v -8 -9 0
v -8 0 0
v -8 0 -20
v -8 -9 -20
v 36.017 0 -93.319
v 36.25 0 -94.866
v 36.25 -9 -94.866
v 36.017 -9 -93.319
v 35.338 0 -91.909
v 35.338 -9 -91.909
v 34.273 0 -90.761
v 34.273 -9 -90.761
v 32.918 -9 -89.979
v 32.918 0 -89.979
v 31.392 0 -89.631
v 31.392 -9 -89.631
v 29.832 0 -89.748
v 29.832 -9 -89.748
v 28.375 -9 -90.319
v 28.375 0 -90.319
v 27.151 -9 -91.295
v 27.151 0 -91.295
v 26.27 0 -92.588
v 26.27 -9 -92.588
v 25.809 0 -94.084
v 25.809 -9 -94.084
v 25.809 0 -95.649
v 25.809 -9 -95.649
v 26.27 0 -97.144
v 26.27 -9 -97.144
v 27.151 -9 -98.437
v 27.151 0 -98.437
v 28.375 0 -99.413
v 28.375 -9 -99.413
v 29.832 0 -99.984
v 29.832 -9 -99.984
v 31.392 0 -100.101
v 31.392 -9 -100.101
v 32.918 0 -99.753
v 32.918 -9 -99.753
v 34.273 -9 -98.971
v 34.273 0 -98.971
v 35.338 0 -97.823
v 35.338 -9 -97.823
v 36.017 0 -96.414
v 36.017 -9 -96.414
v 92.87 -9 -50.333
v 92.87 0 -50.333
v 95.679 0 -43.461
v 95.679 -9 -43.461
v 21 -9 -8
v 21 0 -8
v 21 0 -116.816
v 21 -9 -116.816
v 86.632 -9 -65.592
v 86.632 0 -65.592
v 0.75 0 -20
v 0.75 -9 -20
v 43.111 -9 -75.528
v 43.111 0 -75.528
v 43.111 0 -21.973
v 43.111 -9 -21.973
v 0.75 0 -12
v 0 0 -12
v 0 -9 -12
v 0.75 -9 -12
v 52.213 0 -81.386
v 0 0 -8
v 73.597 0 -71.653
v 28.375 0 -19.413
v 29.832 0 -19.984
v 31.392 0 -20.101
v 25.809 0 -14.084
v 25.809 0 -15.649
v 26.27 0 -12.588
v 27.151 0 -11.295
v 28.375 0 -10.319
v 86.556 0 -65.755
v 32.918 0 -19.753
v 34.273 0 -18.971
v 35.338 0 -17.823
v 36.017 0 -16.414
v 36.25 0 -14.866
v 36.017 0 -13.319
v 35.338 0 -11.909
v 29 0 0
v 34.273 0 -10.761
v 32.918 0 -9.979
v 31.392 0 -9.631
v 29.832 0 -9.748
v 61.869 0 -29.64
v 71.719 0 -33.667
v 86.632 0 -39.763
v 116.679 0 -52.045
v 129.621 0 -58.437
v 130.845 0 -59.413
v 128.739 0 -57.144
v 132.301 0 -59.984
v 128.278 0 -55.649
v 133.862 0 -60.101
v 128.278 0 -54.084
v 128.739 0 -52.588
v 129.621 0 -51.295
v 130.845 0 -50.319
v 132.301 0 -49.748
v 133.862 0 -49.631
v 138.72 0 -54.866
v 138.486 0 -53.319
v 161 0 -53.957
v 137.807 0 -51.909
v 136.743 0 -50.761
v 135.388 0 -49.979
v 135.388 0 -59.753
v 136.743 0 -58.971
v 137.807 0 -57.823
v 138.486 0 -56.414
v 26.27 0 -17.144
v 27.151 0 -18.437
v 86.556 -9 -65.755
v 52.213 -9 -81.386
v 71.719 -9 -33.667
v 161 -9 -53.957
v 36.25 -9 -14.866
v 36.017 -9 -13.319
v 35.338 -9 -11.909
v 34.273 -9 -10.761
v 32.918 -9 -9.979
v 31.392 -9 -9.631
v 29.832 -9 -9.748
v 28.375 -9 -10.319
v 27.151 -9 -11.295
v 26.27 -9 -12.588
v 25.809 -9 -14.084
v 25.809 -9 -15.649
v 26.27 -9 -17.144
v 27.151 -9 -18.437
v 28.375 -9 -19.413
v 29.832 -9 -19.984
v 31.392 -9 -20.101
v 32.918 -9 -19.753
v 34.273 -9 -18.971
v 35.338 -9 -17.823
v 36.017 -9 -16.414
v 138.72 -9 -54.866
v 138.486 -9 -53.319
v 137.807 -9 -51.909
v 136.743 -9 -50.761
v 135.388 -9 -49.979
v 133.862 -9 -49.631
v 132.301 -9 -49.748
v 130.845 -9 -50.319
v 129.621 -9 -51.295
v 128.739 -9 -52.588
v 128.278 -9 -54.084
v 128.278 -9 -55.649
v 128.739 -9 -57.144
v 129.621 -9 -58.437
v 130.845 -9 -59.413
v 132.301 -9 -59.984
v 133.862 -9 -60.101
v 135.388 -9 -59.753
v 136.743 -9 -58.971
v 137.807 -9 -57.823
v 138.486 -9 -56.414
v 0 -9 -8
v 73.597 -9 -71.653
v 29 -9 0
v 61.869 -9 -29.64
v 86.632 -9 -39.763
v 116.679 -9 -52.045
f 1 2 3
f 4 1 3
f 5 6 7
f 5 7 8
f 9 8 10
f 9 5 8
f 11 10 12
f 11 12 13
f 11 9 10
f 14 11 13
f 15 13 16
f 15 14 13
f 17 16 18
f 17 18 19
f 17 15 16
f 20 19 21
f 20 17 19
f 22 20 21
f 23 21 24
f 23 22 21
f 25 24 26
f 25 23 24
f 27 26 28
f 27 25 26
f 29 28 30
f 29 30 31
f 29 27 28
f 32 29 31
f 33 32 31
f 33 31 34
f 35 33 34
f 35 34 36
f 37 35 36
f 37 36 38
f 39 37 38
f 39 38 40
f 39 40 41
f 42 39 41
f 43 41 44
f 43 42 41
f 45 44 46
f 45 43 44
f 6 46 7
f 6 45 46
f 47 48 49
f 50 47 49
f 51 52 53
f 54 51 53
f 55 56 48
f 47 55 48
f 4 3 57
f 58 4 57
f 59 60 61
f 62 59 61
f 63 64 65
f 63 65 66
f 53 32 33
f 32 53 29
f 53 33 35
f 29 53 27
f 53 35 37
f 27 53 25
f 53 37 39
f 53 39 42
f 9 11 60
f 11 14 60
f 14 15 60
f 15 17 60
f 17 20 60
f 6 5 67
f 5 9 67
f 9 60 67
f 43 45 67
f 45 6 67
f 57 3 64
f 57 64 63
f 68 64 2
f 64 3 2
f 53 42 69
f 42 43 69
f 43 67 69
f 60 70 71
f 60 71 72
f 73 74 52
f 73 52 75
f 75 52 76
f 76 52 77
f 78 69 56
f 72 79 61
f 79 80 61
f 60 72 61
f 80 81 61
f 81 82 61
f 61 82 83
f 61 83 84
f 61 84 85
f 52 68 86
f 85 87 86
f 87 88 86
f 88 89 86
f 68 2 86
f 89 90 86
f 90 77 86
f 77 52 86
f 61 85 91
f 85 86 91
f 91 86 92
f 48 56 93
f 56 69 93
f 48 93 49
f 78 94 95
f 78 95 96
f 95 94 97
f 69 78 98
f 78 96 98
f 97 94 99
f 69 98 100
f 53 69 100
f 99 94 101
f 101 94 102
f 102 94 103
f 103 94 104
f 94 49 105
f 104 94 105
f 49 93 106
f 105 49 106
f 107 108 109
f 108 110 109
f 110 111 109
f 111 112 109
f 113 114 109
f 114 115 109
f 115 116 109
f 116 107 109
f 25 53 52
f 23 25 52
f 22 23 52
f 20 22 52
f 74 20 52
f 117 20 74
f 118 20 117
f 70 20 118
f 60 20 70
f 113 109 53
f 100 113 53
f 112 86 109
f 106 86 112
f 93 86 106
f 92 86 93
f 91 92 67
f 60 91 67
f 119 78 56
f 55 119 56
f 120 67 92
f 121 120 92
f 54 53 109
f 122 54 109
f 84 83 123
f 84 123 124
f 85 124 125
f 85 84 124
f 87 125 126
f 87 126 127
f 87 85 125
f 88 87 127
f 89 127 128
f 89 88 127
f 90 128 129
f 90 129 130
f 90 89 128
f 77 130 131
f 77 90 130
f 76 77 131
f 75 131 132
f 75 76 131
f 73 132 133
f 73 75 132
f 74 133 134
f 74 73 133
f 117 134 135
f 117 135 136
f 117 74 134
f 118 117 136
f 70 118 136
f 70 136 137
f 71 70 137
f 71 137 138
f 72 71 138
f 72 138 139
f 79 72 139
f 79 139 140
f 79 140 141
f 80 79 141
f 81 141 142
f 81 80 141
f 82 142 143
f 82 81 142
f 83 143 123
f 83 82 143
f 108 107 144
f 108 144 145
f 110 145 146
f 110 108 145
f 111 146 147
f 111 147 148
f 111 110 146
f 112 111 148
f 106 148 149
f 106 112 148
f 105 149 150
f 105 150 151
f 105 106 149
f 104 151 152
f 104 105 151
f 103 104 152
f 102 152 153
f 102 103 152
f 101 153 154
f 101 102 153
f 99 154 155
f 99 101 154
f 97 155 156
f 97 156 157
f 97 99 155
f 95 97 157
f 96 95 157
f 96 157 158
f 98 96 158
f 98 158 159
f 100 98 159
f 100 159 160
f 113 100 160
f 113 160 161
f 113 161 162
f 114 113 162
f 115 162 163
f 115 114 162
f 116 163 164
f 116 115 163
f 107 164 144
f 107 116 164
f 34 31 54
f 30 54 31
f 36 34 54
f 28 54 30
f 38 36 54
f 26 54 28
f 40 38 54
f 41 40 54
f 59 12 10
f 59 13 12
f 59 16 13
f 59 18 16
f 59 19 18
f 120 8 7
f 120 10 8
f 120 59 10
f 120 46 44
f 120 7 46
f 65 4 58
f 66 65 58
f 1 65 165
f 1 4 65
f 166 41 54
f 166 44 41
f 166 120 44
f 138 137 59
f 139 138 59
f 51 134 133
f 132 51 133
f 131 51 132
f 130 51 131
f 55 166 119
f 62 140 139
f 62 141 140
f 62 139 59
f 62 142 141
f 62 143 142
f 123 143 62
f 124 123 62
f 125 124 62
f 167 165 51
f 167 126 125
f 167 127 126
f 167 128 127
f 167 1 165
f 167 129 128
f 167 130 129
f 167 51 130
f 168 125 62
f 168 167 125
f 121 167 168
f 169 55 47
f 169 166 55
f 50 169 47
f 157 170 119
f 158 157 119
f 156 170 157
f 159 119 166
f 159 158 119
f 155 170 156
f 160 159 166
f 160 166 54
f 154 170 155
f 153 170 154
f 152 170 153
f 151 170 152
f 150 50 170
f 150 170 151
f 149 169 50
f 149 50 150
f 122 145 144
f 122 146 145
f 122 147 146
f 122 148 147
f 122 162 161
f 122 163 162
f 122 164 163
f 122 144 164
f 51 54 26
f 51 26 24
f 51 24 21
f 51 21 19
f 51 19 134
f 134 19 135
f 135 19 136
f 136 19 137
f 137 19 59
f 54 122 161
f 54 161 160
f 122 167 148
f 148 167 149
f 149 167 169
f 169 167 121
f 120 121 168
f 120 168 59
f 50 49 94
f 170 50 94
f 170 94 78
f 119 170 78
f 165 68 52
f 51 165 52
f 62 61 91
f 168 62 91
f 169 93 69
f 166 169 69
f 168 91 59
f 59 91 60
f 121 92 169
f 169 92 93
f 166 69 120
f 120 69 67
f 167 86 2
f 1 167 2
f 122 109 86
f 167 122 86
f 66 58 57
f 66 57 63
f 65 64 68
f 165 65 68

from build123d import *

# Parameters (mm, degrees)
F0_R     = 5.25
F0_W     = 0.75
F0_H     = 8
F1_DEPTH = 9


# Not quite as in the source:
# - a feature names something its author has since deleted; it is built from what else it names


with BuildPart() as f1:
    # F0 (on Front) → F1 (new body)
    with BuildSketch(Plane.XZ):
        Polygon((29, 0), (21, 0), (21, -8), (21, -109.6278309861), (21, -116.8163269758), (161, -53.9573058486), align=None)
        with Locations((31, -94.8660687473)):
            Circle(F0_R, mode=Mode.SUBTRACT)
        with Locations((31, -14.8660687473)):
            Circle(F0_R, mode=Mode.SUBTRACT)
        Polygon((43.1111576917, -75.528110744), (43.1111576917, -21.972979021), (61.8685626933, -29.6403959801), (71.7187130056, -33.6668169881), (86.6322777796, -39.7629971078), (95.6788662869, -43.460948191), (116.6788079217, -52.0450411727), (86.5560721122, -65.7548940175), (73.5966112911, -71.6531730426), (52.2128066716, -81.3856494169), (43.1111576917, -85.528110744), align=None, mode=Mode.SUBTRACT)
        with Locations((133.4695076596, -54.8660687473)):
            Circle(F0_R, mode=Mode.SUBTRACT)
        Polygon((71.7187130056, -33.6668169881), (61.8685626933, -29.6403959801), (43.1111576917, -75.528110744), (43.1111576917, -85.528110744), (52.2128066716, -81.3856494169), align=None)
        Polygon((21, -8), (21, 0), (-8, 0), (-8, -20), (0, -20), (0, -12), (0, -8), align=None)
        with Locations((0.375, -16)):
            Rectangle(F0_W, F0_H)
        Polygon((95.6788662869, -43.460948191), (86.6322777796, -39.7629971078), (73.5966112911, -71.6531730426), (86.5560721122, -65.7548940175), (86.6322777796, -65.5923289964), (92.8699112608, -50.3327157415), align=None)
    extrude(amount=F1_DEPTH)


solid = f1.part
